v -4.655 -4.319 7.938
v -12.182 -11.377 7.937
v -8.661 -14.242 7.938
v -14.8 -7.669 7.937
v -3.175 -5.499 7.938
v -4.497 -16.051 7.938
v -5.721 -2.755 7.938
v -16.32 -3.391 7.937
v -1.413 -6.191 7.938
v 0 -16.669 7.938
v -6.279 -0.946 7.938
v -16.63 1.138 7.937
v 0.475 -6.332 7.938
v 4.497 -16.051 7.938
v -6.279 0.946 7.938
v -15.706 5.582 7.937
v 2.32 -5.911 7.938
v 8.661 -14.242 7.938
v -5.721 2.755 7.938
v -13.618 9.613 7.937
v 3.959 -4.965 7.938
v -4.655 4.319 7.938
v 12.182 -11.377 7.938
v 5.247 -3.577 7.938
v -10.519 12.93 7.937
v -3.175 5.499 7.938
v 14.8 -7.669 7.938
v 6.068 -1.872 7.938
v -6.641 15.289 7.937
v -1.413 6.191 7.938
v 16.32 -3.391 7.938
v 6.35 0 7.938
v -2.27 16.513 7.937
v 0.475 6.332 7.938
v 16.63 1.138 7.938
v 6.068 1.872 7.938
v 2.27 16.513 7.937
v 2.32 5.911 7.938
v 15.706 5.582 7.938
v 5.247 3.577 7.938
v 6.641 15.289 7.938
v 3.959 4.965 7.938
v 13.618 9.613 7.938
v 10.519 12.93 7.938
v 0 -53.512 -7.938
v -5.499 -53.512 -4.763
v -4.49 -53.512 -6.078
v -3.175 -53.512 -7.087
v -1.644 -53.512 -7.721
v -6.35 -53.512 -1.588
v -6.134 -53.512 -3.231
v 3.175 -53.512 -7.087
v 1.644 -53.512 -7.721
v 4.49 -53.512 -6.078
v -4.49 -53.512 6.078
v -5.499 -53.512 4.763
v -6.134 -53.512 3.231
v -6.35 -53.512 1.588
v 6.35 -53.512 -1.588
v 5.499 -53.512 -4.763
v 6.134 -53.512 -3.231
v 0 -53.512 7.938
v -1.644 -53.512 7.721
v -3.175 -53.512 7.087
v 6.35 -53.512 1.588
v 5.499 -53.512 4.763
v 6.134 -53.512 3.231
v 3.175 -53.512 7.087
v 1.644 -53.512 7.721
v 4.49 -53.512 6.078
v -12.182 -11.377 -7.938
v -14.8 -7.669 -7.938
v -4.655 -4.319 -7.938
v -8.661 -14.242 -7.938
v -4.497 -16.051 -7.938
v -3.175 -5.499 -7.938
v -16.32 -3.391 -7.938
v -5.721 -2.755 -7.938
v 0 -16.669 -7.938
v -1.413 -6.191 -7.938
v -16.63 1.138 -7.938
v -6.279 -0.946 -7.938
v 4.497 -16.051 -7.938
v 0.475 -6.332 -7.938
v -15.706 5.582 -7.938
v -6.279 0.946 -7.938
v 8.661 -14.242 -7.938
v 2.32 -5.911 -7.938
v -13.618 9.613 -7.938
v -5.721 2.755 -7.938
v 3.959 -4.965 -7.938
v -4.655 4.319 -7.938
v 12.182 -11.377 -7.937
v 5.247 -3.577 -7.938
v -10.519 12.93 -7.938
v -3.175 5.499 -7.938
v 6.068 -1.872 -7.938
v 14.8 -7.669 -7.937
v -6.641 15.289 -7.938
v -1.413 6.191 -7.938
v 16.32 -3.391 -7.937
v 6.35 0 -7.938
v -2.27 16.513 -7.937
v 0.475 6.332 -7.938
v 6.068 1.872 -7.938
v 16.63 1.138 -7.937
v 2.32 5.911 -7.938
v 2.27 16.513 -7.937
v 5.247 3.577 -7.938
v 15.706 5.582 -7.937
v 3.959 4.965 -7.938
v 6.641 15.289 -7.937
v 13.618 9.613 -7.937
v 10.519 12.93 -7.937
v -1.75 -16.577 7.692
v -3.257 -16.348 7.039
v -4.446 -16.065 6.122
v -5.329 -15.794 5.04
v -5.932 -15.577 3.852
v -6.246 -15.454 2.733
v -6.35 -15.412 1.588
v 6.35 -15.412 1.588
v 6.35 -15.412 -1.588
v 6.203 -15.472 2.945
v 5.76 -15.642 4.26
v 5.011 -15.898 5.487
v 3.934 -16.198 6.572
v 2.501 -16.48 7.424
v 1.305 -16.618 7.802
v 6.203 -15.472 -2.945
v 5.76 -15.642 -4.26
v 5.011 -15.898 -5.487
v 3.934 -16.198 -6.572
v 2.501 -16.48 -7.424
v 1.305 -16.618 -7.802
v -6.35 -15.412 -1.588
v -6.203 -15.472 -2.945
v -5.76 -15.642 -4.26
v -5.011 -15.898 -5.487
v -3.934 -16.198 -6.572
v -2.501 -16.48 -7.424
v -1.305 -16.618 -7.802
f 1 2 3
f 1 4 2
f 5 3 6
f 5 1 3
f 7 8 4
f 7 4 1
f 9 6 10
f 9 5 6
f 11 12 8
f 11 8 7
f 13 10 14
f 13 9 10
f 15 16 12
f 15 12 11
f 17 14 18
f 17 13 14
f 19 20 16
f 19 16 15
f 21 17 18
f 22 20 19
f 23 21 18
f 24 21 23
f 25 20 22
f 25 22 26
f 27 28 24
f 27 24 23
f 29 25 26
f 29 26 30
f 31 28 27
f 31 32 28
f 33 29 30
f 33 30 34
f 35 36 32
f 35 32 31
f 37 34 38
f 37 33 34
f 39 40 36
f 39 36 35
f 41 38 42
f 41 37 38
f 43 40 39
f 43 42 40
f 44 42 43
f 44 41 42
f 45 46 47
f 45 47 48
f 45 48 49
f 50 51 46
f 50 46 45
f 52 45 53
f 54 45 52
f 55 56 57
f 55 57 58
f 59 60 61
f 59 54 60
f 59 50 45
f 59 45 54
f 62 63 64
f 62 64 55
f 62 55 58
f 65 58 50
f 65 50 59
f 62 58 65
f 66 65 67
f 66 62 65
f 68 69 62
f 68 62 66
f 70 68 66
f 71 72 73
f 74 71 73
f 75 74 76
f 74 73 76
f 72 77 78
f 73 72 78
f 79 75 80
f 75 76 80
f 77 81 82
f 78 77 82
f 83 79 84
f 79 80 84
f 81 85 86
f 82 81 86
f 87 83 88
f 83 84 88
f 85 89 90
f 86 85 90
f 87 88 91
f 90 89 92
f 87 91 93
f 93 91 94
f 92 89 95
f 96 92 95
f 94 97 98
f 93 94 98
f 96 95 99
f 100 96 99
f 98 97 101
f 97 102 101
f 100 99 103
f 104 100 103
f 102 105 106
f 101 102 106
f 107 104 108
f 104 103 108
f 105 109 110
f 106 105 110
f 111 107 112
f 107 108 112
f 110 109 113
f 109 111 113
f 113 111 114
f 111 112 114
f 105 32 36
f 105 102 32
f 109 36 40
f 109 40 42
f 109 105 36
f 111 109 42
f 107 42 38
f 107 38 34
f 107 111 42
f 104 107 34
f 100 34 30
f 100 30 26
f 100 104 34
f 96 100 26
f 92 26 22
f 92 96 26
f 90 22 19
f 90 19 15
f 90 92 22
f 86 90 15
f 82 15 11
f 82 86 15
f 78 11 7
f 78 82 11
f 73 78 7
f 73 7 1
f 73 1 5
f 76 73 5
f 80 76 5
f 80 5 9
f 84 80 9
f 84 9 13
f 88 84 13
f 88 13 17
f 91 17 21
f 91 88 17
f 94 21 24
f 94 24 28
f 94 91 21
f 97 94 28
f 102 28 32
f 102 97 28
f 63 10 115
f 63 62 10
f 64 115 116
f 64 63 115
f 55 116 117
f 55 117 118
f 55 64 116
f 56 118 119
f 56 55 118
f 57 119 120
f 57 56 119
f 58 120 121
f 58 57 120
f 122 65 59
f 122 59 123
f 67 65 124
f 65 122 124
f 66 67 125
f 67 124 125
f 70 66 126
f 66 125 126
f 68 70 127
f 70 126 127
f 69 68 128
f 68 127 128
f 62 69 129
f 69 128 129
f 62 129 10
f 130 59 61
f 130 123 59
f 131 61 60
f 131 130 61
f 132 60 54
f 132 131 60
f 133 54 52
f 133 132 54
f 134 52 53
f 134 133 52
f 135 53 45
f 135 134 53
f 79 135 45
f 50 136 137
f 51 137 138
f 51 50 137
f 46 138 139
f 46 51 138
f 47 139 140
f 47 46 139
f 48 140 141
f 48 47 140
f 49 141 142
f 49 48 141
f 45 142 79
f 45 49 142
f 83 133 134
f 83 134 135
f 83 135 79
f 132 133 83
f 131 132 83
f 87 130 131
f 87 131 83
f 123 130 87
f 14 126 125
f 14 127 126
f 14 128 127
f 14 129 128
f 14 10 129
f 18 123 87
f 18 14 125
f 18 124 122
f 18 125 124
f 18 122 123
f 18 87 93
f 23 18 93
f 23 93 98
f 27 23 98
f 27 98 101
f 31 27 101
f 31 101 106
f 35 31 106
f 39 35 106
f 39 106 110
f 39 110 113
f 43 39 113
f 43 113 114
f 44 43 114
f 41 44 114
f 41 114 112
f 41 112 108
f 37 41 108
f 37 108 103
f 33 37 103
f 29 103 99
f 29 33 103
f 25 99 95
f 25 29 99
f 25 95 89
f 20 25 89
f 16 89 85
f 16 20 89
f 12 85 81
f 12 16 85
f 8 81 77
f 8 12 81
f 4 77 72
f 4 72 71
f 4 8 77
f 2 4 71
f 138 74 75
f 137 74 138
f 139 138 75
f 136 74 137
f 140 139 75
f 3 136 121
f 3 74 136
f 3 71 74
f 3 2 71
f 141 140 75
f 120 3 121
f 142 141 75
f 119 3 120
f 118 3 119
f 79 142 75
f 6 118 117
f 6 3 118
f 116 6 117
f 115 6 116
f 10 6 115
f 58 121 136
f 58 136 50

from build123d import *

# Parameters (mm, degrees)
F1_R     = 6.35
F2_DEPTH = 7.9375
F3_R     = 6.34999


# Not quite as in the source:
# - a fillet or chamfer is up to 0.001 mm smaller than in the source, because OpenCascade refuses the exact size


with BuildPart() as f2:
    # F1 (on Top) → F2 (new body, symmetric)
    with BuildSketch(Plane.XY):
        with BuildLine():
            ThreePointArc((6.35, -15.4118372222), (0, 16.66875), (-6.35, -15.4118372222))
            Line((-6.35, -15.4118372222), (-6.35, -53.5118372222))
            Line((-6.35, -53.5118372222), (6.35, -53.5118372222))
            Line((6.35, -53.5118372222), (6.35, -15.4118372222))
        make_face()
        Circle(F1_R, mode=Mode.SUBTRACT)
    extrude(amount=F2_DEPTH, both=True)

    # F3 (radius 6.35 in the source; OpenCascade refuses exactly that, so slightly less here)
    f3_edges = [f2.edges().sort_by_distance(p)[0] for p in [
        (-6.35, -34.461837, -7.9375),
        (6.35, -34.461837, -7.9375),
        (-6.35, -34.461837, 7.9375),
        (6.35, -34.461837, 7.9375),
    ]]
    fillet(f3_edges, radius=F3_R)


solid = f2.part
